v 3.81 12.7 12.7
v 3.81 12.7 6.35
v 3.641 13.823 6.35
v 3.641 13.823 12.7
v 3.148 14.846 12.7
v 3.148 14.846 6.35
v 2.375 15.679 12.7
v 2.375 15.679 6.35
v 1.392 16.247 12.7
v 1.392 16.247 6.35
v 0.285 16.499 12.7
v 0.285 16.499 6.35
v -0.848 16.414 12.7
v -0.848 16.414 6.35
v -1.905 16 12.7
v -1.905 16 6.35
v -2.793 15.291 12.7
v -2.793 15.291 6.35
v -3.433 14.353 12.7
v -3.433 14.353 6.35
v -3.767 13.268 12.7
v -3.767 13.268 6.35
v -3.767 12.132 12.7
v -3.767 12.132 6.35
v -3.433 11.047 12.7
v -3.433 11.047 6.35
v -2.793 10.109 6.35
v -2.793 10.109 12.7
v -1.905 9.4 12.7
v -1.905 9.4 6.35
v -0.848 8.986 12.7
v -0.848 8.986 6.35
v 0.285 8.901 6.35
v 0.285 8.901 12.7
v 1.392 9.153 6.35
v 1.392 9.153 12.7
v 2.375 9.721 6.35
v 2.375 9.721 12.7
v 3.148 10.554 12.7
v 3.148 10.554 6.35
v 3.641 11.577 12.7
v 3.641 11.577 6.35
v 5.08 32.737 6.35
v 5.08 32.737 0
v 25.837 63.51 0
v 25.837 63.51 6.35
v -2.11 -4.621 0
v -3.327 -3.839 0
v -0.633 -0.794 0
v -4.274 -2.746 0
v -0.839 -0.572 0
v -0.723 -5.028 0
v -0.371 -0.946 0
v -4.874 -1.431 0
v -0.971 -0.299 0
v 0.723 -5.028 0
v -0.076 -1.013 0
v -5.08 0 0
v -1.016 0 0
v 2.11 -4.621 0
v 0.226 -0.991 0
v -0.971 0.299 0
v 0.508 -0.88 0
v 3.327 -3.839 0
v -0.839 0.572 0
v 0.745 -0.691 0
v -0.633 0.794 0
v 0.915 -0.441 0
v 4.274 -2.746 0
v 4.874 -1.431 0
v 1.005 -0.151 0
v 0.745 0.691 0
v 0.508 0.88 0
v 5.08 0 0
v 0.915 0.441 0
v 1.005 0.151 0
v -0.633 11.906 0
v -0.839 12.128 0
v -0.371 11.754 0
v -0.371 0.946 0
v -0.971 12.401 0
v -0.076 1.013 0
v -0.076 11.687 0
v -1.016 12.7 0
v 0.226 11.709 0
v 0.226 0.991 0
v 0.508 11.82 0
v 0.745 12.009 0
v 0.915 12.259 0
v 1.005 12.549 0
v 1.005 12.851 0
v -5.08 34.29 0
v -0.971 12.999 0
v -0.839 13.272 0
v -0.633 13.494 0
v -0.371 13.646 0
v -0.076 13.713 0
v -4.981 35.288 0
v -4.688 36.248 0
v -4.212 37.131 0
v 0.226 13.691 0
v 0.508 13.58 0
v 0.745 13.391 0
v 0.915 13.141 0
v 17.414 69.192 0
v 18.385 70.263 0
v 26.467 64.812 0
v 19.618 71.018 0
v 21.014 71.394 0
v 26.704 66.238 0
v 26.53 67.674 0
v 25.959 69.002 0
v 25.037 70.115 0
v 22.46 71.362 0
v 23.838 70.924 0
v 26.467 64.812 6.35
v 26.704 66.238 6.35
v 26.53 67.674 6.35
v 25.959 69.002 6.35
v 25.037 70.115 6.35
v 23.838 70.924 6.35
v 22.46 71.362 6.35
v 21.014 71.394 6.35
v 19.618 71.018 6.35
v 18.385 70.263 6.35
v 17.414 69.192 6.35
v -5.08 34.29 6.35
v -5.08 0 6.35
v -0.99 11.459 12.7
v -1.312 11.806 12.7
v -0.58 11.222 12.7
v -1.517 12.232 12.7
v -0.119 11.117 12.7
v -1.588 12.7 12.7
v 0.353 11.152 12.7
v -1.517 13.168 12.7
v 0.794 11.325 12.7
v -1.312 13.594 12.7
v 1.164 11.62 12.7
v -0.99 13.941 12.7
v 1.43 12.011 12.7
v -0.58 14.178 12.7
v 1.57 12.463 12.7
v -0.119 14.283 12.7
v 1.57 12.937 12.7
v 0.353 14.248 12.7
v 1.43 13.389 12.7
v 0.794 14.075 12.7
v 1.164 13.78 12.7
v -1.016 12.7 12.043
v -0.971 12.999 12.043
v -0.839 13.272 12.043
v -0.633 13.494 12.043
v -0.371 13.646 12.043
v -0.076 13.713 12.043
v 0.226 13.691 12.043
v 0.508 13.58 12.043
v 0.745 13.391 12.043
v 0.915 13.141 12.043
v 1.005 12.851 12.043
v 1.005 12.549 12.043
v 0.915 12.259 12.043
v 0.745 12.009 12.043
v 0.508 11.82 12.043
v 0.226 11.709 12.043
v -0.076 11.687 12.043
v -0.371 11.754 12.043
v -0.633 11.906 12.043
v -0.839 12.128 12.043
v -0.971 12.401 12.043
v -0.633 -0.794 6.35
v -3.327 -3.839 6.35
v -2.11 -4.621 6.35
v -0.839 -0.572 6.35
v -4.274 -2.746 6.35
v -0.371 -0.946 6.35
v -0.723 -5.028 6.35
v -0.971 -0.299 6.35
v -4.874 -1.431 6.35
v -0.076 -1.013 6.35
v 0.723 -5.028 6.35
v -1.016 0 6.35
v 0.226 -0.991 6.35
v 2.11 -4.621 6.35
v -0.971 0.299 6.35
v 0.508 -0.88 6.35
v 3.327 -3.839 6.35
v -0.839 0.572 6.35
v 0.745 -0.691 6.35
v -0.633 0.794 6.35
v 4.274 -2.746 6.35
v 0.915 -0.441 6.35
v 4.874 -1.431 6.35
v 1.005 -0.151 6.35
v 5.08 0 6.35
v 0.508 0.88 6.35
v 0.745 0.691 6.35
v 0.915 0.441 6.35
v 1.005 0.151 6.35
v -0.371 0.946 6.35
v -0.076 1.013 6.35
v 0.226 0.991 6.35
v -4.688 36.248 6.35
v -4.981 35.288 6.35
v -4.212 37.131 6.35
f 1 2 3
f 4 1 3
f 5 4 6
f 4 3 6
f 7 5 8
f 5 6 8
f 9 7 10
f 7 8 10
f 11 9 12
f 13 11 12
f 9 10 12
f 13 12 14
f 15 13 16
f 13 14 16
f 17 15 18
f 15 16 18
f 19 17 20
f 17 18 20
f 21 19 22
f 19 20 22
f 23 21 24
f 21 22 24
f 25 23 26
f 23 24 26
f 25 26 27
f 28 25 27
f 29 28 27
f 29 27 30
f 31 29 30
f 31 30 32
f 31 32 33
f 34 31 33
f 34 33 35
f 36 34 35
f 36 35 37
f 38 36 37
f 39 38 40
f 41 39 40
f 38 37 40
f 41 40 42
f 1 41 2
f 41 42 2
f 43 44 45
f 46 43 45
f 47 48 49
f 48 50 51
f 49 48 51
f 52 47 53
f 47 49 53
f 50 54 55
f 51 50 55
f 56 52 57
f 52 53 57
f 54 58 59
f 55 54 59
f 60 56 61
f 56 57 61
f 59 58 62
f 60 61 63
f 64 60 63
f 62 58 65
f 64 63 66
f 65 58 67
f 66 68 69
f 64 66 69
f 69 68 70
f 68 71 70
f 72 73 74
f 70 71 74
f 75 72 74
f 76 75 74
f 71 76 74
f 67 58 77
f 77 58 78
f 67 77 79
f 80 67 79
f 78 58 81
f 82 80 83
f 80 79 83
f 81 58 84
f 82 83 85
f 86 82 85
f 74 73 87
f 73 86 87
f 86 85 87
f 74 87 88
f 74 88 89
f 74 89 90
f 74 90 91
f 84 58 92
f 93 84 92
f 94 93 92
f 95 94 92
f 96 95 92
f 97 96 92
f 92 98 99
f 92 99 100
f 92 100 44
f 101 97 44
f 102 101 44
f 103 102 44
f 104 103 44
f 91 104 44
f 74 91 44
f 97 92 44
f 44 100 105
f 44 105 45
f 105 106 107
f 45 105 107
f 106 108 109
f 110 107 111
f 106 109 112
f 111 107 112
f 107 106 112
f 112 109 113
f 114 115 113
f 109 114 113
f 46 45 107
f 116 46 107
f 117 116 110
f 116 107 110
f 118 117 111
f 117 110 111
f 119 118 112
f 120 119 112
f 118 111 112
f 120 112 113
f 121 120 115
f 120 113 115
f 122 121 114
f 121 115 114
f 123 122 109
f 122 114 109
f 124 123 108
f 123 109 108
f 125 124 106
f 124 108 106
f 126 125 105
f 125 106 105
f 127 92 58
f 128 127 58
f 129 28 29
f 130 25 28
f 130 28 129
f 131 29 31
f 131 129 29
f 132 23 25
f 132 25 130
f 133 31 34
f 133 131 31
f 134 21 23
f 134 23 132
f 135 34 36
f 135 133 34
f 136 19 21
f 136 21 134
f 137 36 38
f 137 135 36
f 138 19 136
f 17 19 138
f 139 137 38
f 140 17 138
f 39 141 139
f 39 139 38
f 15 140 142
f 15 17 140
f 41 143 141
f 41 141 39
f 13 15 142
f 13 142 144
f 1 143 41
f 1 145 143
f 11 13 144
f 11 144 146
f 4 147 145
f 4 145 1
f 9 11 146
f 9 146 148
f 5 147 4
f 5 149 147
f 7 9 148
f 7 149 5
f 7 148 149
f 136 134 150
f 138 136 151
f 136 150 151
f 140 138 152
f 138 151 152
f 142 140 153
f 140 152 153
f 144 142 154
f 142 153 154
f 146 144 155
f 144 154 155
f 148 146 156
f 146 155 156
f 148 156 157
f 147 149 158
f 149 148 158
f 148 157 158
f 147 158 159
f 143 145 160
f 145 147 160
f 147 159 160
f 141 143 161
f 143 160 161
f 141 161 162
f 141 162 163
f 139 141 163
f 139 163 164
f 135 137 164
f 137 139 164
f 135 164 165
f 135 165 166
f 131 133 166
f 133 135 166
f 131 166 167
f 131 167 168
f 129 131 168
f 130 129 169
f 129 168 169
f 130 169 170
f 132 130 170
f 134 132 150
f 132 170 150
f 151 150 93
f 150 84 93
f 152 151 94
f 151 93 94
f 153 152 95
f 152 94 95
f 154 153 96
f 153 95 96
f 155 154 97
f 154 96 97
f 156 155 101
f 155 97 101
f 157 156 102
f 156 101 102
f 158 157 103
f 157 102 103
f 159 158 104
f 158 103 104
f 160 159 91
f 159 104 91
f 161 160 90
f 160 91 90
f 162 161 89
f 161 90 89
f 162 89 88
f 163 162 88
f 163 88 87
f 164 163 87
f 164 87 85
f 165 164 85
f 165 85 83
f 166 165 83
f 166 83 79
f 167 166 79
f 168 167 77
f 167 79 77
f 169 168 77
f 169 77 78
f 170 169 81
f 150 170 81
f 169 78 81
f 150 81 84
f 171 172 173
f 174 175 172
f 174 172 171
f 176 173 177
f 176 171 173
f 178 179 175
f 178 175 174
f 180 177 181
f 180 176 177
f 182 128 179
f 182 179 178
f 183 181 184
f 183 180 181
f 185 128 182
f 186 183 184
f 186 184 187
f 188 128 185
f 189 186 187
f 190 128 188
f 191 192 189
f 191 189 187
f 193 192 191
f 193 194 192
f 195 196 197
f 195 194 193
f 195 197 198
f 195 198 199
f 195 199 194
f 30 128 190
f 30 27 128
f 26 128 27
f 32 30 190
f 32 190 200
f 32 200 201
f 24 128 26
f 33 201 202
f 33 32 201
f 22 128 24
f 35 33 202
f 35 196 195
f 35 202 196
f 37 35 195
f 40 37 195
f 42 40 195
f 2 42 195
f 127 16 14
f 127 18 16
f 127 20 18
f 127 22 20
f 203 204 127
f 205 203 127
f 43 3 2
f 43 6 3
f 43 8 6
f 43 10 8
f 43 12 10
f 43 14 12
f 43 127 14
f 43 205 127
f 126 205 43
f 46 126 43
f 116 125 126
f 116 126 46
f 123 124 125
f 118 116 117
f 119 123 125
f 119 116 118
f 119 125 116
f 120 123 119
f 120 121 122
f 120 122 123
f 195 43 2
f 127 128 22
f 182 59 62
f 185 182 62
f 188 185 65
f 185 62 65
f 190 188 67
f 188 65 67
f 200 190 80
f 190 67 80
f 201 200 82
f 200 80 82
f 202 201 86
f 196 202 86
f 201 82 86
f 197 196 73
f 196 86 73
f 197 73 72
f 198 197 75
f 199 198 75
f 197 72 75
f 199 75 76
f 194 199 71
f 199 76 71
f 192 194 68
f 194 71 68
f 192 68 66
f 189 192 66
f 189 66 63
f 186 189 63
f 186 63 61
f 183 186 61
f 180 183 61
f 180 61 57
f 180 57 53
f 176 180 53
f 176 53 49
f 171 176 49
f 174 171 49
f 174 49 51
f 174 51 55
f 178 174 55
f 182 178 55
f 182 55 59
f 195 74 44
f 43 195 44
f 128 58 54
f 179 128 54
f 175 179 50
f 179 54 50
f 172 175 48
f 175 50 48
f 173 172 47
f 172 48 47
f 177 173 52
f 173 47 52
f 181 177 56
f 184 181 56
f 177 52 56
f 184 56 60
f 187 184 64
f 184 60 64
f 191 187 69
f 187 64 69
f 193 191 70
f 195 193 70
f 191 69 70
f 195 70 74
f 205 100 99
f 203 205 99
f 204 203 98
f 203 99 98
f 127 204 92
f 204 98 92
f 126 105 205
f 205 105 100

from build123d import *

# Parameters (mm, degrees)
F1_DEPTH       = 6.35
F2_R           = 3.81
F3_DEPTH       = 6.35
F5_D           = 2.032
F5_CSINK_D     = 3.175
F5_CSINK_ANGLE = 82
F7_D           = 2.032


with BuildPart() as f1:
    # F0 (on Top) → F1 (new body)
    with BuildSketch(Plane.XY):
        with BuildLine():
            ThreePointArc((-5.08, 12.7), (-3.5921024484, 9.1078975516), (0, 7.62))
            Line((0, 7.62), (0, 12.7))
            Line((0, 12.7), (0, 17.78))
            ThreePointArc((0, 17.78), (-3.5921024484, 16.2921024484), (-5.08, 12.7))
        make_face()
        with BuildLine():
            Line((0, 12.7), (0, 7.62))
            ThreePointArc((0, 7.62), (3.5921024484, 9.1078975516), (5.08, 12.7))
            ThreePointArc((5.08, 12.7), (3.5921024484, 16.2921024484), (0, 17.78))
            Line((0, 17.78), (0, 12.7))
        make_face()
        with BuildLine():
            ThreePointArc((5.08, 12.7), (3.5921024484, 9.1078975516), (0, 7.62))
            ThreePointArc((0, 7.62), (-3.5921024484, 9.1078975516), (-5.08, 12.7))
            Line((-5.08, 12.7), (-5.08, 0))
            ThreePointArc((-5.08, 0), (0, -5.08), (5.08, 0))
            Line((5.08, 0), (5.08, 12.7))
        make_face()
        with BuildLine():
            ThreePointArc((0, 17.78), (3.5921024484, 16.2921024484), (5.08, 12.7))
            Line((5.08, 12.7), (5.08, 32.7368881382))
            Line((5.08, 32.7368881382), (4.2115108686, 31.4493000504))
            ThreePointArc((4.2115108686, 31.4493000504), (2.384915539, 29.8046262283), (0, 29.21))
            Line((0, 29.21), (0, 17.78))
        make_face()
        with BuildLine():
            Line((-5.08, 34.29), (-5.08, 12.7))
            ThreePointArc((-5.08, 12.7), (-3.5921024484, 16.2921024484), (0, 17.78))
            Line((0, 17.78), (0, 29.21))
            ThreePointArc((0, 29.21), (-3.5921024484, 30.6978975516), (-5.08, 34.29))
        make_face()
        with BuildLine():
            Line((4.2115108686, 31.4493000504), (5.08, 32.7368881382))
            Line((5.08, 32.7368881382), (5.08, 34.29))
            ThreePointArc((5.08, 34.29), (4.4853737717, 36.674915539), (2.8406999496, 38.5015108686))
            Line((2.8406999496, 38.5015108686), (0, 34.29))
            Line((0, 34.29), (0, 29.21))
            ThreePointArc((0, 29.21), (2.384915539, 29.8046262283), (4.2115108686, 31.4493000504))
        make_face()
        with BuildLine():
            Line((5.08, 34.29), (5.08, 32.7368881382))
            Line((5.08, 32.7368881382), (25.8370032919, 63.5104110421))
            ThreePointArc((25.8370032919, 63.5104110421), (24.466192373, 70.5626218603), (17.4139815548, 69.1918109413))
            Line((17.4139815548, 69.1918109413), (-4.2115108686, 37.1306999496))
            ThreePointArc((-4.2115108686, 37.1306999496), (-0.9693096965, 39.2766660919), (2.8406999496, 38.5015108686))
            ThreePointArc((2.8406999496, 38.5015108686), (4.4853737717, 36.674915539), (5.08, 34.29))
        make_face()
        with BuildLine():
            ThreePointArc((-4.2115108686, 37.1306999496), (-4.8580281603, 35.77524826), (-5.08, 34.29))
            ThreePointArc((-5.08, 34.29), (-3.5921024484, 30.6978975516), (0, 29.21))
            Line((0, 29.21), (0, 34.29))
            Line((0, 34.29), (2.8406999496, 38.5015108686))
            ThreePointArc((2.8406999496, 38.5015108686), (-0.9693096965, 39.2766660919), (-4.2115108686, 37.1306999496))
        make_face()
    extrude(amount=F1_DEPTH)

    # F2 (on face) → F3 (join)
    with BuildSketch(Plane.XY.offset(6.35)):
        with Locations((0, 12.7)):
            Circle(F2_R)
    extrude(amount=F3_DEPTH)

    # F5 (through all)
    with Locations(Plane.XY.offset(12.7)):
        with Locations((0, 12.7)):
            CounterSinkHole(F5_D / 2, F5_CSINK_D / 2, counter_sink_angle=F5_CSINK_ANGLE)

    # F7 (through all)
    with Locations(Plane.XY.offset(6.35)):
        with Locations((0, 0)):
            Hole(F7_D / 2)


solid = f1.part
